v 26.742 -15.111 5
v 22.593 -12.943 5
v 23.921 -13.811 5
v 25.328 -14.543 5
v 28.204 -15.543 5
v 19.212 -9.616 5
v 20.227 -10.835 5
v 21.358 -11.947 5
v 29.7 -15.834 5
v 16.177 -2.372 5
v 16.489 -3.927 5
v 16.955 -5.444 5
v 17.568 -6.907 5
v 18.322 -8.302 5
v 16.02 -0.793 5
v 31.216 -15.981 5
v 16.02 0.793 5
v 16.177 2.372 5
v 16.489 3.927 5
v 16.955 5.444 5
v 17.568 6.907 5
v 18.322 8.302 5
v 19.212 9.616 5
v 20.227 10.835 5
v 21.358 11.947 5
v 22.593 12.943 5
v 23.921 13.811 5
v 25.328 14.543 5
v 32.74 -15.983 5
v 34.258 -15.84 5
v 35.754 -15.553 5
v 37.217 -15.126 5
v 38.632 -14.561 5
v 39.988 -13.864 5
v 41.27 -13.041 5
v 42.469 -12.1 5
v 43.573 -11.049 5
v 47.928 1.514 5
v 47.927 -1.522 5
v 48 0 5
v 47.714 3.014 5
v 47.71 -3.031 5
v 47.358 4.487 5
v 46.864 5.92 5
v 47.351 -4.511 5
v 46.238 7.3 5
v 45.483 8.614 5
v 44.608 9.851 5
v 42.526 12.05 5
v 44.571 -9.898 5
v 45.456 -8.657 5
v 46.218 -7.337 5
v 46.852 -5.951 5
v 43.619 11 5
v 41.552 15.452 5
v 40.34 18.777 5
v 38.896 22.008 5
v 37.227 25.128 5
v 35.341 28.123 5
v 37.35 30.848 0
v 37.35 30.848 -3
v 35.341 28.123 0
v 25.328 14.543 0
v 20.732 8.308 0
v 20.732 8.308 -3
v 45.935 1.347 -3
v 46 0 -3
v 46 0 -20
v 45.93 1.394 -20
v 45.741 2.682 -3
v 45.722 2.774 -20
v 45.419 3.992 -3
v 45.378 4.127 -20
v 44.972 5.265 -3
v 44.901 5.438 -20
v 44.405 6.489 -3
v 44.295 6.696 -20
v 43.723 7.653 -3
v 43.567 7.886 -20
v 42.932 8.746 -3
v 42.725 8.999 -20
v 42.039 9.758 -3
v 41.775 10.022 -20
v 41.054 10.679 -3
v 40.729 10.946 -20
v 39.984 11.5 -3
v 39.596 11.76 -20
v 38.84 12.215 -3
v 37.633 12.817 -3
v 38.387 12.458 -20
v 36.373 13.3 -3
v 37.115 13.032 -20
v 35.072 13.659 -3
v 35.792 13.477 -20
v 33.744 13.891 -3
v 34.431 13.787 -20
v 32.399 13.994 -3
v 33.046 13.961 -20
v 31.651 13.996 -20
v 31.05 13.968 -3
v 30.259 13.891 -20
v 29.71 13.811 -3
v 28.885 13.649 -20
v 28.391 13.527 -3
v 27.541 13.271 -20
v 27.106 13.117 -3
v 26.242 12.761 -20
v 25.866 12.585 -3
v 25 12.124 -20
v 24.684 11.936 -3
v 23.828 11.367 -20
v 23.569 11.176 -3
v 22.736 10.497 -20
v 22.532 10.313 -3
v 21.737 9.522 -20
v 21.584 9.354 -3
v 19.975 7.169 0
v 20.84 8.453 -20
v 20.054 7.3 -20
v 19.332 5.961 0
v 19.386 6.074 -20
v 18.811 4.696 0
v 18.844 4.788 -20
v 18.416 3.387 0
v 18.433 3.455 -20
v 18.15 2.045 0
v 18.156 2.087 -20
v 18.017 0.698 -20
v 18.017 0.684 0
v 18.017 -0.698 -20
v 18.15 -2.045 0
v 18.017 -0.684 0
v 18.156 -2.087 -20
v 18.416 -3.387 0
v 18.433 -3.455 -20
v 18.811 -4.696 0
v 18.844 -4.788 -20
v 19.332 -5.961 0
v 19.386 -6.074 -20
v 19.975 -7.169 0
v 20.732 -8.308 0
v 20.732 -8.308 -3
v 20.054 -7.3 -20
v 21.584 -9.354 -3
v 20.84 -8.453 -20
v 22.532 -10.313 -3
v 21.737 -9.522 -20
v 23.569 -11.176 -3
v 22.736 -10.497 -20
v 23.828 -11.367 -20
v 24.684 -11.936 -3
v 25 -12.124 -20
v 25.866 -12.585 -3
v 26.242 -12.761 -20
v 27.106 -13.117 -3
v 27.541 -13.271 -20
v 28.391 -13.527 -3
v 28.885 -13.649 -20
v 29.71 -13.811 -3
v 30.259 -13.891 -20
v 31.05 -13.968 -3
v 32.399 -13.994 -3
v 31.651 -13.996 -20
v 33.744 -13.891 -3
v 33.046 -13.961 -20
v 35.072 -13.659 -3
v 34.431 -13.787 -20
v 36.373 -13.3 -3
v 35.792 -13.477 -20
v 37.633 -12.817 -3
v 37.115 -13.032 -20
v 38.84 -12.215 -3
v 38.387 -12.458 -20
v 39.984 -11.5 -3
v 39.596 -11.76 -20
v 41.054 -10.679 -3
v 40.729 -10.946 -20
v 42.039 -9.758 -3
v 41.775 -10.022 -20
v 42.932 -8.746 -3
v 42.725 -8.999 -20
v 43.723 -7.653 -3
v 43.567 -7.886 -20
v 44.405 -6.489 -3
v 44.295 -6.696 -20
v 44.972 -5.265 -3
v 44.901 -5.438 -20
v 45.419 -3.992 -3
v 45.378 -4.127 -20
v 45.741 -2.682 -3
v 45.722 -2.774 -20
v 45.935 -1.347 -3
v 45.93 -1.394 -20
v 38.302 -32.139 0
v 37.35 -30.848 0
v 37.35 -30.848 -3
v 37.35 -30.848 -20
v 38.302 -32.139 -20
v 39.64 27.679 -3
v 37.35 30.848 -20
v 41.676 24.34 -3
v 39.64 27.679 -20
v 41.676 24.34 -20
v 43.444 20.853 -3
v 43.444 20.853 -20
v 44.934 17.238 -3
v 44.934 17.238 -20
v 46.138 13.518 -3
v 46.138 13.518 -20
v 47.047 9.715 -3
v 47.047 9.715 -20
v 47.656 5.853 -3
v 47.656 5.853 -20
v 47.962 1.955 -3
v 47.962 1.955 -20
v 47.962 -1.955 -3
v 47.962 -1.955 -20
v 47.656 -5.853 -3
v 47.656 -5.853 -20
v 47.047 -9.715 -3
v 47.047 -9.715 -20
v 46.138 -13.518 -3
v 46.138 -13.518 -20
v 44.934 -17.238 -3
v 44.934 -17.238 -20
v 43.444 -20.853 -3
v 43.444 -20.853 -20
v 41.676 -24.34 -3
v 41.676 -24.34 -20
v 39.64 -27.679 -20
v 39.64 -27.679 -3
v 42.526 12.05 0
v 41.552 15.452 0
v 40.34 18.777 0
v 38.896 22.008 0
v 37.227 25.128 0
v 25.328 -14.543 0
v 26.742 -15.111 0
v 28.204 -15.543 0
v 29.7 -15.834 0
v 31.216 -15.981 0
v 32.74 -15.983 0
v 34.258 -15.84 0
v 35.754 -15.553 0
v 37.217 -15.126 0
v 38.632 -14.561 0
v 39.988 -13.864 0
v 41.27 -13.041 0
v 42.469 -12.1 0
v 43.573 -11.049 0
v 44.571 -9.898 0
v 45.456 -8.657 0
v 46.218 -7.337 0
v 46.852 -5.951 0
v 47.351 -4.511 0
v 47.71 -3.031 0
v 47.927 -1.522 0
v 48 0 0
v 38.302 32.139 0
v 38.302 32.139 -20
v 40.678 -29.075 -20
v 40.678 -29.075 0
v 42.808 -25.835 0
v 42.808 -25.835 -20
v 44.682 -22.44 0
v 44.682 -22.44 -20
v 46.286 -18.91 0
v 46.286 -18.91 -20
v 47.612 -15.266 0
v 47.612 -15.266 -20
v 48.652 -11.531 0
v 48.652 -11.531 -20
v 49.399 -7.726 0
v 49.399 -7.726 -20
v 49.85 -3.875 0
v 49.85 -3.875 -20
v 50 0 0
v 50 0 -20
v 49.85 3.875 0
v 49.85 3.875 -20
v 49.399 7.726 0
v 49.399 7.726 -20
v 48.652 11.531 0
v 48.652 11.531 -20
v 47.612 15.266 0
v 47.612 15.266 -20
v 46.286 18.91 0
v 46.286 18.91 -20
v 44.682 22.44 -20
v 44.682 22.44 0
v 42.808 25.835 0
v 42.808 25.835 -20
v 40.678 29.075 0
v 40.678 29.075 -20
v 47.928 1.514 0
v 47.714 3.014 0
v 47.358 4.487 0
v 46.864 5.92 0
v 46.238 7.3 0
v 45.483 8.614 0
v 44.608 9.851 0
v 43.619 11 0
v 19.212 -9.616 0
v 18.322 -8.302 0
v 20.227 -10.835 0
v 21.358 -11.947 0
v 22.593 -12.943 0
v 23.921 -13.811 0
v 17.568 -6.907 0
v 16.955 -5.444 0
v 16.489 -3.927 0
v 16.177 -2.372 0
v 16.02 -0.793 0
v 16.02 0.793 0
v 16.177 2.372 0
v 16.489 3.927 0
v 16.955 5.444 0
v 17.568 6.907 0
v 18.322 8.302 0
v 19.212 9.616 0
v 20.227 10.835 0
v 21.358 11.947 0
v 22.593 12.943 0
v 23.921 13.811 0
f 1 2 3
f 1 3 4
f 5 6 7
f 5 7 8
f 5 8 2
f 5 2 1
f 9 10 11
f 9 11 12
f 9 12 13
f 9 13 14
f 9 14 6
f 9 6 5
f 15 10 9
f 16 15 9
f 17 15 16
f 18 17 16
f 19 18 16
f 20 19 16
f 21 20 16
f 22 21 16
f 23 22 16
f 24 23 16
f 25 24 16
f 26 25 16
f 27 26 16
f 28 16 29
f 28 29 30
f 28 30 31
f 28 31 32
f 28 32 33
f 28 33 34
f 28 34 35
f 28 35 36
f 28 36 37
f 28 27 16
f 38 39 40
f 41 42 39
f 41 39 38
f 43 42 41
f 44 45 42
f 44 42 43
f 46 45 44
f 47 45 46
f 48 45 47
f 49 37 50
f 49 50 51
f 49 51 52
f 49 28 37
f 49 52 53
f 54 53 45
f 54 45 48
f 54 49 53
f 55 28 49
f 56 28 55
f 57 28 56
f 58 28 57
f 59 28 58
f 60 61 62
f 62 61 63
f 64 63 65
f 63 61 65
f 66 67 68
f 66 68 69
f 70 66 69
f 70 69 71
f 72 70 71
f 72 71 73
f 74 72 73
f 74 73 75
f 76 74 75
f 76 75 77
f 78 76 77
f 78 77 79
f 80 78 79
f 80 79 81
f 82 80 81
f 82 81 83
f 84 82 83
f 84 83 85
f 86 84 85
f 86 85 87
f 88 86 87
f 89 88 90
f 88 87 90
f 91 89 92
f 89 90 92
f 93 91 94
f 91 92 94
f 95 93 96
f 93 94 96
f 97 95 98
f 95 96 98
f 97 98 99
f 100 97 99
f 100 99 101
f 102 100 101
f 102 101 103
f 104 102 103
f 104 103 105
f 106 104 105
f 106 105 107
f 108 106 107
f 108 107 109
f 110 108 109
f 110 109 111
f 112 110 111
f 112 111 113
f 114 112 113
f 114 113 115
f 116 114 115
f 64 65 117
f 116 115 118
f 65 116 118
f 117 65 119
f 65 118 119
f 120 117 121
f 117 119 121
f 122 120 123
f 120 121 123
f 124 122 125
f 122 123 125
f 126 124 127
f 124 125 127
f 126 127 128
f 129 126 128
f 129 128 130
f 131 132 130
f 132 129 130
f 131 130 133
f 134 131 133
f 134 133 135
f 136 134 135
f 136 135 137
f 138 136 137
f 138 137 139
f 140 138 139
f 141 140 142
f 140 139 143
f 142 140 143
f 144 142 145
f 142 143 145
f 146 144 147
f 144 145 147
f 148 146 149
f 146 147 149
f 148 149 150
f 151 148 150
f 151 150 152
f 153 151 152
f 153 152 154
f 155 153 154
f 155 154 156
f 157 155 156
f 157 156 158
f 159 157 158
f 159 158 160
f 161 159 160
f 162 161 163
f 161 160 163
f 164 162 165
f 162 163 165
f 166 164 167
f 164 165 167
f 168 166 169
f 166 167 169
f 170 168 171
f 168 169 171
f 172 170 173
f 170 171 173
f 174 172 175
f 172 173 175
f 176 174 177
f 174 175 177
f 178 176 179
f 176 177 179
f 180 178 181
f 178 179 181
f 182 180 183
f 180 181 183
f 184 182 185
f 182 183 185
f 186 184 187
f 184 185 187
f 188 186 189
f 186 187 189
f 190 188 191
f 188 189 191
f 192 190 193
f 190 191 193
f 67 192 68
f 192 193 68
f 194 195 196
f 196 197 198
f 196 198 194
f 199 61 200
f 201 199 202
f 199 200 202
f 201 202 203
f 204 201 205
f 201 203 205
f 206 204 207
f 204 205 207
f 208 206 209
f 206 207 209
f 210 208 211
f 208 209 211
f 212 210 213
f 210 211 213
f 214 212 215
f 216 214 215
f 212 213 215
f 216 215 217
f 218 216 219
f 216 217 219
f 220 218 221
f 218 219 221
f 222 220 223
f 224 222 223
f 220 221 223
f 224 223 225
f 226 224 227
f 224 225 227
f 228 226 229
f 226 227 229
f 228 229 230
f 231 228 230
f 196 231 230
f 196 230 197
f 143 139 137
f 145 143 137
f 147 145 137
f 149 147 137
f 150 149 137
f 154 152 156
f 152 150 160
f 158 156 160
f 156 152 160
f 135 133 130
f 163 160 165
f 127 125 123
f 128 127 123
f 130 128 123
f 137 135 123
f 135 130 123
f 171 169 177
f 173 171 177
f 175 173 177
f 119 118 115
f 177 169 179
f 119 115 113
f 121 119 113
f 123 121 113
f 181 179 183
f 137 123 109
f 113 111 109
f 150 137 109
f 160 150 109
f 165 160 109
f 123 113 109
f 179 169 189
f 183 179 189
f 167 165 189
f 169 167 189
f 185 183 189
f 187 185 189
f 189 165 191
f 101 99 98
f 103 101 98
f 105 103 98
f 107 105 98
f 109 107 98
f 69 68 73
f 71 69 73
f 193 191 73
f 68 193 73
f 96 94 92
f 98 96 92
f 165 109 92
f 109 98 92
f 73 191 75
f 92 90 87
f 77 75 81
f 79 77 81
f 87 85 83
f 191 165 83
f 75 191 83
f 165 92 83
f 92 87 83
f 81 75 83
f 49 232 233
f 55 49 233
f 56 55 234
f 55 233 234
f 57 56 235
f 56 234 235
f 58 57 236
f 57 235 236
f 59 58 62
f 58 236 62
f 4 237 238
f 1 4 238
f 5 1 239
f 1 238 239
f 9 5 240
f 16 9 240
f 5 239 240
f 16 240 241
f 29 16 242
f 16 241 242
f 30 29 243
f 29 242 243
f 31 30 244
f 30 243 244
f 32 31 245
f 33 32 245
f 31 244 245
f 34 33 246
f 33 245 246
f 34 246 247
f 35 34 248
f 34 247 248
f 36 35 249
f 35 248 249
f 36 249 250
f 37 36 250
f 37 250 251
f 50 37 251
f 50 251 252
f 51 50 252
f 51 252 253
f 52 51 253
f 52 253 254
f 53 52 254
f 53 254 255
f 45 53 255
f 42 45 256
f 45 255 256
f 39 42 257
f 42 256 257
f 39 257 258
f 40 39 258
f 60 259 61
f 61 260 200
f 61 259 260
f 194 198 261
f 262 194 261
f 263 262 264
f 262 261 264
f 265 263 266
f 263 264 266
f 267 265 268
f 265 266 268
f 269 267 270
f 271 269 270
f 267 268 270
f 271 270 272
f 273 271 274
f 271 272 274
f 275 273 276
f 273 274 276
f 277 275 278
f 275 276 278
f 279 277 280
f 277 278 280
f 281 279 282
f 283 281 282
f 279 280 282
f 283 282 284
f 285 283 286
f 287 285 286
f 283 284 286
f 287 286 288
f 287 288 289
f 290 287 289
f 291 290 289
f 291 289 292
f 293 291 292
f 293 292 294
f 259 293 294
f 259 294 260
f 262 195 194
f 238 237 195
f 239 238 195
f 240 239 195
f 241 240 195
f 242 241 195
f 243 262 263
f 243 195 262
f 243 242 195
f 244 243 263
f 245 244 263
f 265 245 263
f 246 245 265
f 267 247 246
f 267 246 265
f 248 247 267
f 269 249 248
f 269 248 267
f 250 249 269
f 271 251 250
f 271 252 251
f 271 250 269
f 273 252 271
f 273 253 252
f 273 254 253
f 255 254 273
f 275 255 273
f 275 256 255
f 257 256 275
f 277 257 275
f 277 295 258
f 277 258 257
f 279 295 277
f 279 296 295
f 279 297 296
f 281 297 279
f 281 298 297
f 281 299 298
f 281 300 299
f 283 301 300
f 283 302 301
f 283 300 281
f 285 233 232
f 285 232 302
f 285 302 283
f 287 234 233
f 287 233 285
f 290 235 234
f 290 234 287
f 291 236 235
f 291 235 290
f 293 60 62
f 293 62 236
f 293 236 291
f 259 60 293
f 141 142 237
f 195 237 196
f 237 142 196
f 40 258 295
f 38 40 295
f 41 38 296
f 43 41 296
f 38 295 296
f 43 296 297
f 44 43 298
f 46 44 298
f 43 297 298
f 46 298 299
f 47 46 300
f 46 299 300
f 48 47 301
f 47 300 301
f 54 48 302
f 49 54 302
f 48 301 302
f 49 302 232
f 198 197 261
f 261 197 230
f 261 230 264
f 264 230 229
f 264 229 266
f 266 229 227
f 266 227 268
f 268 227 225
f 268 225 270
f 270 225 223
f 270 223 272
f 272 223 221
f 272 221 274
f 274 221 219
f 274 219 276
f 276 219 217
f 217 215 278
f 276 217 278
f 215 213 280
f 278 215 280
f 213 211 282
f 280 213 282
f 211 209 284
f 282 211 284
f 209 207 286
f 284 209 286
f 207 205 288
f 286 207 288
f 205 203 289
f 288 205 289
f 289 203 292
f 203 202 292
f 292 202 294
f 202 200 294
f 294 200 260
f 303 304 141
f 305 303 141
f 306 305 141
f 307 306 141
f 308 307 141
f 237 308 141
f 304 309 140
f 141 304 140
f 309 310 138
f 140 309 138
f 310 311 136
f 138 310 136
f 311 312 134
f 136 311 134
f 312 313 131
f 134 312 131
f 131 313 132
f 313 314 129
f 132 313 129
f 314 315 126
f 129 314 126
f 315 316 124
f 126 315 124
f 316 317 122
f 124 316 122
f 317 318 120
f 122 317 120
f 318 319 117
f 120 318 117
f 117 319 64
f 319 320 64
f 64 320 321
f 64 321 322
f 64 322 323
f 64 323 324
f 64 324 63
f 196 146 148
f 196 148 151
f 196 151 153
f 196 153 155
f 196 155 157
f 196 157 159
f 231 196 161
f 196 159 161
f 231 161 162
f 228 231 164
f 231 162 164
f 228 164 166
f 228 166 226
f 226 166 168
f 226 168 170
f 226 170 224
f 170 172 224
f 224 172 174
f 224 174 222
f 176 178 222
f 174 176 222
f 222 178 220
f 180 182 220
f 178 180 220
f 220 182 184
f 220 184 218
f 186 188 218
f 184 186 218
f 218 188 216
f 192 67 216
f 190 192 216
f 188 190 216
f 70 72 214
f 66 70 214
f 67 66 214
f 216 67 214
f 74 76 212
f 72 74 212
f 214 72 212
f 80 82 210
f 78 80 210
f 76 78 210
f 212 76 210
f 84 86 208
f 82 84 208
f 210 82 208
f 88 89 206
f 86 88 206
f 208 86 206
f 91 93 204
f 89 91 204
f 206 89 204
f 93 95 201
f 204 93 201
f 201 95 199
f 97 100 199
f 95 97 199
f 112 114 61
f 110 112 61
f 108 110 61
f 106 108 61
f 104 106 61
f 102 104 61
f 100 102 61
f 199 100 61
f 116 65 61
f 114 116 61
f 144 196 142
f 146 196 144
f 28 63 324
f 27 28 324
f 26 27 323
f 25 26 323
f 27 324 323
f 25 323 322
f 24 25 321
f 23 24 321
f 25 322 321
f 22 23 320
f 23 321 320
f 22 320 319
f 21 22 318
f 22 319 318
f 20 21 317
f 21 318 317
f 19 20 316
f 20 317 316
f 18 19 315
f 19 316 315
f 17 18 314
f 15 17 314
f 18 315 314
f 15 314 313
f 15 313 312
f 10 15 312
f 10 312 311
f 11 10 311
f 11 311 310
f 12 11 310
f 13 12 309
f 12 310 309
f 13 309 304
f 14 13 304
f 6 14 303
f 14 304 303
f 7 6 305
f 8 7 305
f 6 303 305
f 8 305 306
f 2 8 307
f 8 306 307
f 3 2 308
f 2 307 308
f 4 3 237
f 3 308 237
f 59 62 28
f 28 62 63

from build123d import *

# Parameters (mm, degrees)
SKETCH3_R           = 14
BOSS_EXTRUDE1_DEPTH = 5
BOSS_EXTRUDE2_START = -3
BOSS_EXTRUDE2_DEPTH = 3
BOSS_EXTRUDE3_START = -20
BOSS_EXTRUDE3_DEPTH = 20
BOSS_EXTRUDE4_START = -20
SKETCH3_5_R         = 14
BOSS_EXTRUDE4_DEPTH = 20
BOSS_EXTRUDE5_DEPTH = 5


with BuildPart() as part:
    # Sketch3 → Boss-Extrude1 (new body)
    with BuildSketch(Plane.XY):
        with Locations((32, 0)):
            Circle(SKETCH3_R)
    extrude(amount=BOSS_EXTRUDE1_DEPTH)

    # Sketch3<3> → Boss-Extrude2 (add)
    with BuildSketch(Plane.XY.offset(BOSS_EXTRUDE2_START)):
        with BuildLine():
            ThreePointArc((38.302222156, -32.139380484), (50, 0), (38.302222156, 32.139380484))
            Line((38.302222156, 32.139380484), (20.731628295, 8.308056278))
            ThreePointArc((20.731628295, 8.308056278), (18, 0), (20.731628295, -8.308056278))
            Line((20.731628295, -8.308056278), (38.302222156, -32.139380484))
        make_face()
    extrude(amount=BOSS_EXTRUDE2_DEPTH)

    # Sketch3<4> → Boss-Extrude3 (add)
    with BuildSketch(Plane.XY.offset(BOSS_EXTRUDE3_START)):
        with BuildLine():
            ThreePointArc((38.302222156, -32.139380484), (50, 0), (38.302222156, 32.139380484))
            Line((38.302222156, 32.139380484), (37.349918698, 30.84775354))
            ThreePointArc((37.349918698, 30.84775354), (48, 0), (37.349918698, -30.84775354))
            Line((37.349918698, -30.84775354), (38.302222156, -32.139380484))
        make_face()
    extrude(amount=BOSS_EXTRUDE3_DEPTH)

    # Sketch3<5> → Boss-Extrude4 (add)
    with BuildSketch(Plane.XY.offset(BOSS_EXTRUDE4_START)):
        with Locations((32, 0)):
            Circle(SKETCH3_5_R)
    extrude(amount=BOSS_EXTRUDE4_DEPTH)

    # Sketch4 → Boss-Extrude5 (add)
    with BuildSketch(Plane.XY):
        with BuildLine():
            ThreePointArc((42.526315789, 12.049758334), (39.646765333, 20.405215379), (35.341109992, 28.123168822))
            Line((35.341109992, 28.123168822), (25.328337382, 14.542658557))
            ThreePointArc((25.328337382, 14.542658557), (29.704738436, -15.834512129), (42.526315789, 12.049758334))
        make_face()
    extrude(amount=BOSS_EXTRUDE5_DEPTH)


solid = part.part
